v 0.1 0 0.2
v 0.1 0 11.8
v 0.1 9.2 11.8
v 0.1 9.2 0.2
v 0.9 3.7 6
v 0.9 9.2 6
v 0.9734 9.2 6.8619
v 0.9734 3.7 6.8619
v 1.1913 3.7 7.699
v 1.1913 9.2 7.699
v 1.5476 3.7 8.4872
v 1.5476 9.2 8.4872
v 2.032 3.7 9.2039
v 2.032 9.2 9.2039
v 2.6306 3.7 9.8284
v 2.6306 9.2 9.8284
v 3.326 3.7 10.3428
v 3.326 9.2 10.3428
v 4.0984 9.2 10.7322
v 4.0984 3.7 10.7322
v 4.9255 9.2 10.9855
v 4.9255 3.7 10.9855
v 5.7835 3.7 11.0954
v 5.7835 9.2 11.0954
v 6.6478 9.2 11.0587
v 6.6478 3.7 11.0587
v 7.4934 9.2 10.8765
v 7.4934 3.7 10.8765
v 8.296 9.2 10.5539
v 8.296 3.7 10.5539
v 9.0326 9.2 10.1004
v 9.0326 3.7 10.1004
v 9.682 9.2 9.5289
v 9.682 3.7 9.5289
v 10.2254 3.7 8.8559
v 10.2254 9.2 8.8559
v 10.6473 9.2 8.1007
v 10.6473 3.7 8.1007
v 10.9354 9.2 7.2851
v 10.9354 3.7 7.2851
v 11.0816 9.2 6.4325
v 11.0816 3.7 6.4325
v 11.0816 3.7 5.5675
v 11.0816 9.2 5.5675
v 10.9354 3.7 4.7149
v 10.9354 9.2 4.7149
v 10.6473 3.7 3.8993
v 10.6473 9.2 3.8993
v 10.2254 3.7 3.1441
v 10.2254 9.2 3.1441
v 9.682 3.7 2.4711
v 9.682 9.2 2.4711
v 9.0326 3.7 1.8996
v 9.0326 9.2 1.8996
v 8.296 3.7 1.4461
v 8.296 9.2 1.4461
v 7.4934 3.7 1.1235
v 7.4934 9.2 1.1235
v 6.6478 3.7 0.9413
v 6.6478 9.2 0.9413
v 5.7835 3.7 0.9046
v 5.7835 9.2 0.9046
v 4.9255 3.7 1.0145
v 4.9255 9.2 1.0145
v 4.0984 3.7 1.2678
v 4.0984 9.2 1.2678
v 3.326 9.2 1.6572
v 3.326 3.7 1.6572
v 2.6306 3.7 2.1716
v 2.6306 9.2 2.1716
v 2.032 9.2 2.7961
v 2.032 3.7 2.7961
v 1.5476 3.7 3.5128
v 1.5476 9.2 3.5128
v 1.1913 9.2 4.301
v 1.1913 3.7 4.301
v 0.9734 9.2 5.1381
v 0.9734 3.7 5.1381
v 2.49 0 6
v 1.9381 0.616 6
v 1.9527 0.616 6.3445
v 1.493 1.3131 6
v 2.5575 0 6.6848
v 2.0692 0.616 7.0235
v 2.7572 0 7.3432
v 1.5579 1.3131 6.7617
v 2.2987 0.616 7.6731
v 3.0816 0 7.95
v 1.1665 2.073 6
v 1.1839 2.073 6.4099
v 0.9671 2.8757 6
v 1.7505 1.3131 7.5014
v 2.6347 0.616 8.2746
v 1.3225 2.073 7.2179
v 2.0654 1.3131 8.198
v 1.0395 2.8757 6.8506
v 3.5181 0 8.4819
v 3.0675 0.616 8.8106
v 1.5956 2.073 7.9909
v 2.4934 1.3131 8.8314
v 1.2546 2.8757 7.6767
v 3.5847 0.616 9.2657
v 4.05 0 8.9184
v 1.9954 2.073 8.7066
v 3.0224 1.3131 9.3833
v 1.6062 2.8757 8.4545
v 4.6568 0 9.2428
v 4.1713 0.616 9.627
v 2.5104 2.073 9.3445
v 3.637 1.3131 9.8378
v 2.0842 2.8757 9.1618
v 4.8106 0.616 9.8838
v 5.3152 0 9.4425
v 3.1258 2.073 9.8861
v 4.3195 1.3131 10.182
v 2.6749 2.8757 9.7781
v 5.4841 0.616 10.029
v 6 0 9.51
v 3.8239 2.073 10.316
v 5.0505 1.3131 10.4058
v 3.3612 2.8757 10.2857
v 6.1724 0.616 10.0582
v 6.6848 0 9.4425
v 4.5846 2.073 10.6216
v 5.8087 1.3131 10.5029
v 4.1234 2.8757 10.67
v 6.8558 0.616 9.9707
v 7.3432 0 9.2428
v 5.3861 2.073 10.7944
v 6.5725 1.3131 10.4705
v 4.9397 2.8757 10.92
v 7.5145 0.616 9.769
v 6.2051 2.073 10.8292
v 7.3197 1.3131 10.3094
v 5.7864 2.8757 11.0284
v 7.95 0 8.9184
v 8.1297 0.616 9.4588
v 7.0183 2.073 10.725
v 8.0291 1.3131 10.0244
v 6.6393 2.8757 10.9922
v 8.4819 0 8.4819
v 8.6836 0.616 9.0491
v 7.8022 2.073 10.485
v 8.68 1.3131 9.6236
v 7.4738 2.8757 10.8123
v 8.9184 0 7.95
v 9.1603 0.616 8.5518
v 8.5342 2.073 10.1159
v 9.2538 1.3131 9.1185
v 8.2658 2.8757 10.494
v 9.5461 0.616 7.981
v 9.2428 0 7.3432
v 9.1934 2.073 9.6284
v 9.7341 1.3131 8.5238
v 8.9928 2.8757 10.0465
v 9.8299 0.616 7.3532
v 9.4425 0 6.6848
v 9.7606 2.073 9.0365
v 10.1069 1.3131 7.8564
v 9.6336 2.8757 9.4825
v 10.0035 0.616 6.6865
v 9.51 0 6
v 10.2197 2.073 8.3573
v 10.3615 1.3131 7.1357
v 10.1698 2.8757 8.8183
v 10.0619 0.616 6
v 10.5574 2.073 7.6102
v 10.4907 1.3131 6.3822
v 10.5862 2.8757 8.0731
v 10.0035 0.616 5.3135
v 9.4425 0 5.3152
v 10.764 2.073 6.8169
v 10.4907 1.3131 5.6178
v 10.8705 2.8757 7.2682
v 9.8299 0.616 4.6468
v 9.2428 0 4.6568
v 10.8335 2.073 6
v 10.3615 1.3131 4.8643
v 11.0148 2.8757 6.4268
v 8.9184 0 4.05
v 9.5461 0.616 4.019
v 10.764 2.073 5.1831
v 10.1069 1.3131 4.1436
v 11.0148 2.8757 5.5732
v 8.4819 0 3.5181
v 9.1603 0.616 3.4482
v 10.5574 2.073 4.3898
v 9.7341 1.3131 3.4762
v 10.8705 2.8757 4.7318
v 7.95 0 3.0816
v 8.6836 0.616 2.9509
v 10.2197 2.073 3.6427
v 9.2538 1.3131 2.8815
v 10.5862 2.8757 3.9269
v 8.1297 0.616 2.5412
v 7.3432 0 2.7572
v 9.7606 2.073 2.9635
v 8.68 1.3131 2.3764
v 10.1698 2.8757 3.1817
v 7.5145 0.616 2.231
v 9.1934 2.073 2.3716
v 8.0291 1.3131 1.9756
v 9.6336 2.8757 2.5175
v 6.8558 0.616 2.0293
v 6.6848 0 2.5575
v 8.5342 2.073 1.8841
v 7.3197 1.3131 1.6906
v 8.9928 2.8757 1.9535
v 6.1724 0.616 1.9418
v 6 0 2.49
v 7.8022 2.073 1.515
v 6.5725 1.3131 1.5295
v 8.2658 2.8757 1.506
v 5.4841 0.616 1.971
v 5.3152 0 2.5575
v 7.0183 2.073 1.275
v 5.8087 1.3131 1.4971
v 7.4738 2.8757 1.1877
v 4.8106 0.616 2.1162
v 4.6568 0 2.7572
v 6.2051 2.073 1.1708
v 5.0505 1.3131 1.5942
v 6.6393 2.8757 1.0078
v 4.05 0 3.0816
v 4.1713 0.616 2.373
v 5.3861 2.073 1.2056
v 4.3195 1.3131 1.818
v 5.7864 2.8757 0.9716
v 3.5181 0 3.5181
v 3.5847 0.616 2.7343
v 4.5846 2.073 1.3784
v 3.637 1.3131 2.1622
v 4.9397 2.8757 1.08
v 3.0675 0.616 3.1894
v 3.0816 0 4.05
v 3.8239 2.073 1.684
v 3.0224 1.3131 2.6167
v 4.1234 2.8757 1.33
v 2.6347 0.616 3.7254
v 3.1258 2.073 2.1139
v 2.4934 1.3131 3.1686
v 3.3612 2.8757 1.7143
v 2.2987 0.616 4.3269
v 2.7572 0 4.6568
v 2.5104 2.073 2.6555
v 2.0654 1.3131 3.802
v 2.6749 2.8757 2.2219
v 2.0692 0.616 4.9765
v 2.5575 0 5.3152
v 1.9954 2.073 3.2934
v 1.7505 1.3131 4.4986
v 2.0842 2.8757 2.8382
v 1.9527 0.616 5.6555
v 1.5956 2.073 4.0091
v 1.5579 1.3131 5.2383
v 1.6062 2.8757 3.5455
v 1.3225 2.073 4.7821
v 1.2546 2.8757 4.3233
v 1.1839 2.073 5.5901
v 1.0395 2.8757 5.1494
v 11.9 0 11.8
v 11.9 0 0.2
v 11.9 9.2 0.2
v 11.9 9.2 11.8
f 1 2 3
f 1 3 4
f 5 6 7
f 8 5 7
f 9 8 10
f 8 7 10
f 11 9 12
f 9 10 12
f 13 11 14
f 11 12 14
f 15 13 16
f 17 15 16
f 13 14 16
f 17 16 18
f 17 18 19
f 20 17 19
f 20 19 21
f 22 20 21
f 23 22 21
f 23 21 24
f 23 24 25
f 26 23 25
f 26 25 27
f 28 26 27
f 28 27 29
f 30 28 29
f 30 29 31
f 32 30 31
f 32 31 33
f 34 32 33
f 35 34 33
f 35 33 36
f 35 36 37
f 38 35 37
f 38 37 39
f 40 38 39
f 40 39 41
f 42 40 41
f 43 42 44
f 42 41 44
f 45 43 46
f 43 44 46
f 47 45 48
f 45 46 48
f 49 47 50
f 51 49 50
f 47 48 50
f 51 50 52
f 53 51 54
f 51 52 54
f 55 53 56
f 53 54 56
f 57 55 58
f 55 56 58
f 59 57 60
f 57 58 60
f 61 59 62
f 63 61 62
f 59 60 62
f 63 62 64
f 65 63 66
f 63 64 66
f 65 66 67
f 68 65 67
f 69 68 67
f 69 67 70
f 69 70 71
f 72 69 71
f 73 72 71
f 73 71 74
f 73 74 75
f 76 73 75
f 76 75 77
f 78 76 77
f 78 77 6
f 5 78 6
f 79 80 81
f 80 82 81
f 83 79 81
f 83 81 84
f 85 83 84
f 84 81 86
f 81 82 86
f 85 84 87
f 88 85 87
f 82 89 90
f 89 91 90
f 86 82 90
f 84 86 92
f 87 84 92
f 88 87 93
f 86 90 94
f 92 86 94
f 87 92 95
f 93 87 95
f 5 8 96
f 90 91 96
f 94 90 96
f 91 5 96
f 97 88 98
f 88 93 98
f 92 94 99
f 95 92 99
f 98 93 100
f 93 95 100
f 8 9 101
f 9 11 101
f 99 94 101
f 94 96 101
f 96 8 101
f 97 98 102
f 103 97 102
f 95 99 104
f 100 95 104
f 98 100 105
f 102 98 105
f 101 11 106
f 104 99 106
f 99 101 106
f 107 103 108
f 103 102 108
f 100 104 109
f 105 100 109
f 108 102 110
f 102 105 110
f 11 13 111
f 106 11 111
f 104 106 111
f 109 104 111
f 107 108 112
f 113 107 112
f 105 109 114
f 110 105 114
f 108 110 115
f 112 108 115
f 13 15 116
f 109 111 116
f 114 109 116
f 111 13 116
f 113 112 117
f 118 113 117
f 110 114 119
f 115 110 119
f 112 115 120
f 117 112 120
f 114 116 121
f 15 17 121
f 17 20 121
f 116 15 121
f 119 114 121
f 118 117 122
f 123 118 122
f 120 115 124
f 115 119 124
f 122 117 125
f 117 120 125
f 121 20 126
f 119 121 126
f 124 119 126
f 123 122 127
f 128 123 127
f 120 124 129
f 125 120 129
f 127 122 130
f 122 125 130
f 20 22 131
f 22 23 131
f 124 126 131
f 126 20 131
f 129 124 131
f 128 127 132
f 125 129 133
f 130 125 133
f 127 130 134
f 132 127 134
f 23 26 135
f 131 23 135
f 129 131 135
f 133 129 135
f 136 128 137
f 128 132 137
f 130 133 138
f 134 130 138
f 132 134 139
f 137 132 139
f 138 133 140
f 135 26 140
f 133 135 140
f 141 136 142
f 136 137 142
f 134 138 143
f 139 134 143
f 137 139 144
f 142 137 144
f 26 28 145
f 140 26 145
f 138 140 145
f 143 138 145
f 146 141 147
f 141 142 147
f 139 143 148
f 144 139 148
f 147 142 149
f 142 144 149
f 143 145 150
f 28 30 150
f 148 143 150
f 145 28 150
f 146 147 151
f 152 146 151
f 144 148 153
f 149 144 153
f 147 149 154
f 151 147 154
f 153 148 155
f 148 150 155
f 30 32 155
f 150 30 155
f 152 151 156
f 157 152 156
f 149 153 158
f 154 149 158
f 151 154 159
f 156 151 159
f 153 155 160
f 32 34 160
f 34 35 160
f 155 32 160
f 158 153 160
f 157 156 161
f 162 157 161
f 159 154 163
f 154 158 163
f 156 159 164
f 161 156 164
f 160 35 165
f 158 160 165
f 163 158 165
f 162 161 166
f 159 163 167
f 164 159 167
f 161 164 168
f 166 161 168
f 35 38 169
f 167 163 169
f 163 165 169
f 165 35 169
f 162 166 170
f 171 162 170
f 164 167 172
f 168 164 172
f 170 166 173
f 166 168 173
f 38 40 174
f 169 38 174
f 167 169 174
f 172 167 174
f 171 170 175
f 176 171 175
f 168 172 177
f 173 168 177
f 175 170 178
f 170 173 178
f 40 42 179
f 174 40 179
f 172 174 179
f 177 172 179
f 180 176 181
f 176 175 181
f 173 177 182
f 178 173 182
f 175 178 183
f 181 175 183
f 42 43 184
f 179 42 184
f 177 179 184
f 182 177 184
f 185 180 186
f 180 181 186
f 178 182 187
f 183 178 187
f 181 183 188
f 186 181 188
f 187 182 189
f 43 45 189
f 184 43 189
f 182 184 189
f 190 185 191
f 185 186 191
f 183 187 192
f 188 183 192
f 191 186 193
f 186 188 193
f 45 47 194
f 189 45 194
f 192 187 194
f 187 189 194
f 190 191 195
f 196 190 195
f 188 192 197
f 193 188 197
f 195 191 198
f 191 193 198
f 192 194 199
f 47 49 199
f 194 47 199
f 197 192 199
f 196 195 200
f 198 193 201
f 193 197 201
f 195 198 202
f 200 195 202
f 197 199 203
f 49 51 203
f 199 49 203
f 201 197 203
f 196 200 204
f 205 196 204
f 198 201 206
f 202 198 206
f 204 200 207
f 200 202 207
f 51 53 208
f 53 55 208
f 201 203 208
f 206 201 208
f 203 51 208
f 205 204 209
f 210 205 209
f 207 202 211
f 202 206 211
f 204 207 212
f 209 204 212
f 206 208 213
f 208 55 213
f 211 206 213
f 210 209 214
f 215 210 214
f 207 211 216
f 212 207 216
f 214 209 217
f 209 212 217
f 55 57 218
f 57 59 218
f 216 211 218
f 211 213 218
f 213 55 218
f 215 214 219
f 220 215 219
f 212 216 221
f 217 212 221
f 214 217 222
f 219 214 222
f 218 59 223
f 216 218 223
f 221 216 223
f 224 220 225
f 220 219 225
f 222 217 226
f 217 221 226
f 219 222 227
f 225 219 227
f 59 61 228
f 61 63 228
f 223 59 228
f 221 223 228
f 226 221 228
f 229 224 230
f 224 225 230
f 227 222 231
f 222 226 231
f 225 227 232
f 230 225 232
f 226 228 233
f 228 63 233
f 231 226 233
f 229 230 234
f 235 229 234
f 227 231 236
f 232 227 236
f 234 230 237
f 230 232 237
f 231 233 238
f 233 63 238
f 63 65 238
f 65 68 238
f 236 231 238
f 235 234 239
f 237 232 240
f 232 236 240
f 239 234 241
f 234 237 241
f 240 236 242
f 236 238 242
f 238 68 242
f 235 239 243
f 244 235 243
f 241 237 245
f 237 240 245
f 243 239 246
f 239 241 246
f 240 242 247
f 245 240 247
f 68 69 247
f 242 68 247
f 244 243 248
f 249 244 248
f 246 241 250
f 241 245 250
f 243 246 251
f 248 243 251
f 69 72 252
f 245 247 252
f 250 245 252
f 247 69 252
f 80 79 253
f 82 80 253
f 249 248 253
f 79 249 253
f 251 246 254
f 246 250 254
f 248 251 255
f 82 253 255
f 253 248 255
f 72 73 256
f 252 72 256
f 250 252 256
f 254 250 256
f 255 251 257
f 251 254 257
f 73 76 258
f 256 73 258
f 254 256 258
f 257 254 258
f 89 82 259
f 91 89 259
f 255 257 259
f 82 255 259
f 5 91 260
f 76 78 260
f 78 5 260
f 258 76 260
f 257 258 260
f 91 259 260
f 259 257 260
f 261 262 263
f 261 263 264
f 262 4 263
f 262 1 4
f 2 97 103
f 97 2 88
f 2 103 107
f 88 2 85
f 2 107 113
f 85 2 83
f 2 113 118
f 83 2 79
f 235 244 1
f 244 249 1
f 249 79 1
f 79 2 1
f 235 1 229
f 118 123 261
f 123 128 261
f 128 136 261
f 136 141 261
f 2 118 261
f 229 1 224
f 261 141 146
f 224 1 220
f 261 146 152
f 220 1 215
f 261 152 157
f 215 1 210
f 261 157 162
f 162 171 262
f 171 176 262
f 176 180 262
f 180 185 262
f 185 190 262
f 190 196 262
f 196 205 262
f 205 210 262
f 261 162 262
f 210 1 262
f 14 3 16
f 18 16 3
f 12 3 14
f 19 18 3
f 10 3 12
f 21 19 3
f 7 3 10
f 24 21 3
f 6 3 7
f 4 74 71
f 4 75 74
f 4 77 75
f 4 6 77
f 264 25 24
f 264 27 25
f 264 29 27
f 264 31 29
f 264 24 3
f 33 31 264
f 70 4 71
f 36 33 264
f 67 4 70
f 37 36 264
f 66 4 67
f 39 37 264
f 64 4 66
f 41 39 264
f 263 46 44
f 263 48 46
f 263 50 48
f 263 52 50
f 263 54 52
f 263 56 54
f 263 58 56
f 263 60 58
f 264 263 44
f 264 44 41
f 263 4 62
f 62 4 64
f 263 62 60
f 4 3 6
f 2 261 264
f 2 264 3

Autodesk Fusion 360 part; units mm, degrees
sketch "Sketch1" plane through (0, 0, 0) normal (0, 1, 0) x (1, 0, 0)
  line L0 (0, 0) -> (12, 0)
  line L1 (12, 0) -> (12, -12)
  line L2 (12, -12) -> (0, -12)
  line L3 (0, -12) -> (0, 0)
  dimension "d1" = 12
  dimension "d2" = 12
extrude "Extrude1" add sketch "Sketch1" along normal blind 9.2
sketch "Sketch9" plane through (0, 9.2, 0) normal (0, 1, 0) x (-1, 0, 0)
  line L0 (0, 12) -> (-12, 12)
  line L1 (-12, 12) -> (-12, 0)
  line L2 (-12, 0) -> (0, 0)
  line L3 (0, 0) -> (0, 12)
  circle A0 centre (-6, 6) radius 5.1
  dimension "d6" = 10.2
extrude "Extrude2" cut sketch "Sketch9" against normal blind 5.5 contours A0
sphere "SpherePrimitive2" cut diameter 10.2 placed x (-1, 0, 0) y (0, 0, 1) z (0, 1, 0) at (6, 3.7, 6)
extrude "Extrude3" cut 1 faces at (0, 3.0667, 8) along direction (1, 0, 0) blind 0.1
extrude "Extrude4" cut 1 faces at (12, 3.0667, 4) along direction (-1, 0, 0) blind 0.1
extrude "Extrude5" cut 1 faces at (4.0333, 3.0667, 0) along direction (0, 0, 1) blind 0.2
extrude "Extrude6" cut 1 faces at (7.9667, 3.0667, 12) along direction (0, 0, -1) blind 0.2
